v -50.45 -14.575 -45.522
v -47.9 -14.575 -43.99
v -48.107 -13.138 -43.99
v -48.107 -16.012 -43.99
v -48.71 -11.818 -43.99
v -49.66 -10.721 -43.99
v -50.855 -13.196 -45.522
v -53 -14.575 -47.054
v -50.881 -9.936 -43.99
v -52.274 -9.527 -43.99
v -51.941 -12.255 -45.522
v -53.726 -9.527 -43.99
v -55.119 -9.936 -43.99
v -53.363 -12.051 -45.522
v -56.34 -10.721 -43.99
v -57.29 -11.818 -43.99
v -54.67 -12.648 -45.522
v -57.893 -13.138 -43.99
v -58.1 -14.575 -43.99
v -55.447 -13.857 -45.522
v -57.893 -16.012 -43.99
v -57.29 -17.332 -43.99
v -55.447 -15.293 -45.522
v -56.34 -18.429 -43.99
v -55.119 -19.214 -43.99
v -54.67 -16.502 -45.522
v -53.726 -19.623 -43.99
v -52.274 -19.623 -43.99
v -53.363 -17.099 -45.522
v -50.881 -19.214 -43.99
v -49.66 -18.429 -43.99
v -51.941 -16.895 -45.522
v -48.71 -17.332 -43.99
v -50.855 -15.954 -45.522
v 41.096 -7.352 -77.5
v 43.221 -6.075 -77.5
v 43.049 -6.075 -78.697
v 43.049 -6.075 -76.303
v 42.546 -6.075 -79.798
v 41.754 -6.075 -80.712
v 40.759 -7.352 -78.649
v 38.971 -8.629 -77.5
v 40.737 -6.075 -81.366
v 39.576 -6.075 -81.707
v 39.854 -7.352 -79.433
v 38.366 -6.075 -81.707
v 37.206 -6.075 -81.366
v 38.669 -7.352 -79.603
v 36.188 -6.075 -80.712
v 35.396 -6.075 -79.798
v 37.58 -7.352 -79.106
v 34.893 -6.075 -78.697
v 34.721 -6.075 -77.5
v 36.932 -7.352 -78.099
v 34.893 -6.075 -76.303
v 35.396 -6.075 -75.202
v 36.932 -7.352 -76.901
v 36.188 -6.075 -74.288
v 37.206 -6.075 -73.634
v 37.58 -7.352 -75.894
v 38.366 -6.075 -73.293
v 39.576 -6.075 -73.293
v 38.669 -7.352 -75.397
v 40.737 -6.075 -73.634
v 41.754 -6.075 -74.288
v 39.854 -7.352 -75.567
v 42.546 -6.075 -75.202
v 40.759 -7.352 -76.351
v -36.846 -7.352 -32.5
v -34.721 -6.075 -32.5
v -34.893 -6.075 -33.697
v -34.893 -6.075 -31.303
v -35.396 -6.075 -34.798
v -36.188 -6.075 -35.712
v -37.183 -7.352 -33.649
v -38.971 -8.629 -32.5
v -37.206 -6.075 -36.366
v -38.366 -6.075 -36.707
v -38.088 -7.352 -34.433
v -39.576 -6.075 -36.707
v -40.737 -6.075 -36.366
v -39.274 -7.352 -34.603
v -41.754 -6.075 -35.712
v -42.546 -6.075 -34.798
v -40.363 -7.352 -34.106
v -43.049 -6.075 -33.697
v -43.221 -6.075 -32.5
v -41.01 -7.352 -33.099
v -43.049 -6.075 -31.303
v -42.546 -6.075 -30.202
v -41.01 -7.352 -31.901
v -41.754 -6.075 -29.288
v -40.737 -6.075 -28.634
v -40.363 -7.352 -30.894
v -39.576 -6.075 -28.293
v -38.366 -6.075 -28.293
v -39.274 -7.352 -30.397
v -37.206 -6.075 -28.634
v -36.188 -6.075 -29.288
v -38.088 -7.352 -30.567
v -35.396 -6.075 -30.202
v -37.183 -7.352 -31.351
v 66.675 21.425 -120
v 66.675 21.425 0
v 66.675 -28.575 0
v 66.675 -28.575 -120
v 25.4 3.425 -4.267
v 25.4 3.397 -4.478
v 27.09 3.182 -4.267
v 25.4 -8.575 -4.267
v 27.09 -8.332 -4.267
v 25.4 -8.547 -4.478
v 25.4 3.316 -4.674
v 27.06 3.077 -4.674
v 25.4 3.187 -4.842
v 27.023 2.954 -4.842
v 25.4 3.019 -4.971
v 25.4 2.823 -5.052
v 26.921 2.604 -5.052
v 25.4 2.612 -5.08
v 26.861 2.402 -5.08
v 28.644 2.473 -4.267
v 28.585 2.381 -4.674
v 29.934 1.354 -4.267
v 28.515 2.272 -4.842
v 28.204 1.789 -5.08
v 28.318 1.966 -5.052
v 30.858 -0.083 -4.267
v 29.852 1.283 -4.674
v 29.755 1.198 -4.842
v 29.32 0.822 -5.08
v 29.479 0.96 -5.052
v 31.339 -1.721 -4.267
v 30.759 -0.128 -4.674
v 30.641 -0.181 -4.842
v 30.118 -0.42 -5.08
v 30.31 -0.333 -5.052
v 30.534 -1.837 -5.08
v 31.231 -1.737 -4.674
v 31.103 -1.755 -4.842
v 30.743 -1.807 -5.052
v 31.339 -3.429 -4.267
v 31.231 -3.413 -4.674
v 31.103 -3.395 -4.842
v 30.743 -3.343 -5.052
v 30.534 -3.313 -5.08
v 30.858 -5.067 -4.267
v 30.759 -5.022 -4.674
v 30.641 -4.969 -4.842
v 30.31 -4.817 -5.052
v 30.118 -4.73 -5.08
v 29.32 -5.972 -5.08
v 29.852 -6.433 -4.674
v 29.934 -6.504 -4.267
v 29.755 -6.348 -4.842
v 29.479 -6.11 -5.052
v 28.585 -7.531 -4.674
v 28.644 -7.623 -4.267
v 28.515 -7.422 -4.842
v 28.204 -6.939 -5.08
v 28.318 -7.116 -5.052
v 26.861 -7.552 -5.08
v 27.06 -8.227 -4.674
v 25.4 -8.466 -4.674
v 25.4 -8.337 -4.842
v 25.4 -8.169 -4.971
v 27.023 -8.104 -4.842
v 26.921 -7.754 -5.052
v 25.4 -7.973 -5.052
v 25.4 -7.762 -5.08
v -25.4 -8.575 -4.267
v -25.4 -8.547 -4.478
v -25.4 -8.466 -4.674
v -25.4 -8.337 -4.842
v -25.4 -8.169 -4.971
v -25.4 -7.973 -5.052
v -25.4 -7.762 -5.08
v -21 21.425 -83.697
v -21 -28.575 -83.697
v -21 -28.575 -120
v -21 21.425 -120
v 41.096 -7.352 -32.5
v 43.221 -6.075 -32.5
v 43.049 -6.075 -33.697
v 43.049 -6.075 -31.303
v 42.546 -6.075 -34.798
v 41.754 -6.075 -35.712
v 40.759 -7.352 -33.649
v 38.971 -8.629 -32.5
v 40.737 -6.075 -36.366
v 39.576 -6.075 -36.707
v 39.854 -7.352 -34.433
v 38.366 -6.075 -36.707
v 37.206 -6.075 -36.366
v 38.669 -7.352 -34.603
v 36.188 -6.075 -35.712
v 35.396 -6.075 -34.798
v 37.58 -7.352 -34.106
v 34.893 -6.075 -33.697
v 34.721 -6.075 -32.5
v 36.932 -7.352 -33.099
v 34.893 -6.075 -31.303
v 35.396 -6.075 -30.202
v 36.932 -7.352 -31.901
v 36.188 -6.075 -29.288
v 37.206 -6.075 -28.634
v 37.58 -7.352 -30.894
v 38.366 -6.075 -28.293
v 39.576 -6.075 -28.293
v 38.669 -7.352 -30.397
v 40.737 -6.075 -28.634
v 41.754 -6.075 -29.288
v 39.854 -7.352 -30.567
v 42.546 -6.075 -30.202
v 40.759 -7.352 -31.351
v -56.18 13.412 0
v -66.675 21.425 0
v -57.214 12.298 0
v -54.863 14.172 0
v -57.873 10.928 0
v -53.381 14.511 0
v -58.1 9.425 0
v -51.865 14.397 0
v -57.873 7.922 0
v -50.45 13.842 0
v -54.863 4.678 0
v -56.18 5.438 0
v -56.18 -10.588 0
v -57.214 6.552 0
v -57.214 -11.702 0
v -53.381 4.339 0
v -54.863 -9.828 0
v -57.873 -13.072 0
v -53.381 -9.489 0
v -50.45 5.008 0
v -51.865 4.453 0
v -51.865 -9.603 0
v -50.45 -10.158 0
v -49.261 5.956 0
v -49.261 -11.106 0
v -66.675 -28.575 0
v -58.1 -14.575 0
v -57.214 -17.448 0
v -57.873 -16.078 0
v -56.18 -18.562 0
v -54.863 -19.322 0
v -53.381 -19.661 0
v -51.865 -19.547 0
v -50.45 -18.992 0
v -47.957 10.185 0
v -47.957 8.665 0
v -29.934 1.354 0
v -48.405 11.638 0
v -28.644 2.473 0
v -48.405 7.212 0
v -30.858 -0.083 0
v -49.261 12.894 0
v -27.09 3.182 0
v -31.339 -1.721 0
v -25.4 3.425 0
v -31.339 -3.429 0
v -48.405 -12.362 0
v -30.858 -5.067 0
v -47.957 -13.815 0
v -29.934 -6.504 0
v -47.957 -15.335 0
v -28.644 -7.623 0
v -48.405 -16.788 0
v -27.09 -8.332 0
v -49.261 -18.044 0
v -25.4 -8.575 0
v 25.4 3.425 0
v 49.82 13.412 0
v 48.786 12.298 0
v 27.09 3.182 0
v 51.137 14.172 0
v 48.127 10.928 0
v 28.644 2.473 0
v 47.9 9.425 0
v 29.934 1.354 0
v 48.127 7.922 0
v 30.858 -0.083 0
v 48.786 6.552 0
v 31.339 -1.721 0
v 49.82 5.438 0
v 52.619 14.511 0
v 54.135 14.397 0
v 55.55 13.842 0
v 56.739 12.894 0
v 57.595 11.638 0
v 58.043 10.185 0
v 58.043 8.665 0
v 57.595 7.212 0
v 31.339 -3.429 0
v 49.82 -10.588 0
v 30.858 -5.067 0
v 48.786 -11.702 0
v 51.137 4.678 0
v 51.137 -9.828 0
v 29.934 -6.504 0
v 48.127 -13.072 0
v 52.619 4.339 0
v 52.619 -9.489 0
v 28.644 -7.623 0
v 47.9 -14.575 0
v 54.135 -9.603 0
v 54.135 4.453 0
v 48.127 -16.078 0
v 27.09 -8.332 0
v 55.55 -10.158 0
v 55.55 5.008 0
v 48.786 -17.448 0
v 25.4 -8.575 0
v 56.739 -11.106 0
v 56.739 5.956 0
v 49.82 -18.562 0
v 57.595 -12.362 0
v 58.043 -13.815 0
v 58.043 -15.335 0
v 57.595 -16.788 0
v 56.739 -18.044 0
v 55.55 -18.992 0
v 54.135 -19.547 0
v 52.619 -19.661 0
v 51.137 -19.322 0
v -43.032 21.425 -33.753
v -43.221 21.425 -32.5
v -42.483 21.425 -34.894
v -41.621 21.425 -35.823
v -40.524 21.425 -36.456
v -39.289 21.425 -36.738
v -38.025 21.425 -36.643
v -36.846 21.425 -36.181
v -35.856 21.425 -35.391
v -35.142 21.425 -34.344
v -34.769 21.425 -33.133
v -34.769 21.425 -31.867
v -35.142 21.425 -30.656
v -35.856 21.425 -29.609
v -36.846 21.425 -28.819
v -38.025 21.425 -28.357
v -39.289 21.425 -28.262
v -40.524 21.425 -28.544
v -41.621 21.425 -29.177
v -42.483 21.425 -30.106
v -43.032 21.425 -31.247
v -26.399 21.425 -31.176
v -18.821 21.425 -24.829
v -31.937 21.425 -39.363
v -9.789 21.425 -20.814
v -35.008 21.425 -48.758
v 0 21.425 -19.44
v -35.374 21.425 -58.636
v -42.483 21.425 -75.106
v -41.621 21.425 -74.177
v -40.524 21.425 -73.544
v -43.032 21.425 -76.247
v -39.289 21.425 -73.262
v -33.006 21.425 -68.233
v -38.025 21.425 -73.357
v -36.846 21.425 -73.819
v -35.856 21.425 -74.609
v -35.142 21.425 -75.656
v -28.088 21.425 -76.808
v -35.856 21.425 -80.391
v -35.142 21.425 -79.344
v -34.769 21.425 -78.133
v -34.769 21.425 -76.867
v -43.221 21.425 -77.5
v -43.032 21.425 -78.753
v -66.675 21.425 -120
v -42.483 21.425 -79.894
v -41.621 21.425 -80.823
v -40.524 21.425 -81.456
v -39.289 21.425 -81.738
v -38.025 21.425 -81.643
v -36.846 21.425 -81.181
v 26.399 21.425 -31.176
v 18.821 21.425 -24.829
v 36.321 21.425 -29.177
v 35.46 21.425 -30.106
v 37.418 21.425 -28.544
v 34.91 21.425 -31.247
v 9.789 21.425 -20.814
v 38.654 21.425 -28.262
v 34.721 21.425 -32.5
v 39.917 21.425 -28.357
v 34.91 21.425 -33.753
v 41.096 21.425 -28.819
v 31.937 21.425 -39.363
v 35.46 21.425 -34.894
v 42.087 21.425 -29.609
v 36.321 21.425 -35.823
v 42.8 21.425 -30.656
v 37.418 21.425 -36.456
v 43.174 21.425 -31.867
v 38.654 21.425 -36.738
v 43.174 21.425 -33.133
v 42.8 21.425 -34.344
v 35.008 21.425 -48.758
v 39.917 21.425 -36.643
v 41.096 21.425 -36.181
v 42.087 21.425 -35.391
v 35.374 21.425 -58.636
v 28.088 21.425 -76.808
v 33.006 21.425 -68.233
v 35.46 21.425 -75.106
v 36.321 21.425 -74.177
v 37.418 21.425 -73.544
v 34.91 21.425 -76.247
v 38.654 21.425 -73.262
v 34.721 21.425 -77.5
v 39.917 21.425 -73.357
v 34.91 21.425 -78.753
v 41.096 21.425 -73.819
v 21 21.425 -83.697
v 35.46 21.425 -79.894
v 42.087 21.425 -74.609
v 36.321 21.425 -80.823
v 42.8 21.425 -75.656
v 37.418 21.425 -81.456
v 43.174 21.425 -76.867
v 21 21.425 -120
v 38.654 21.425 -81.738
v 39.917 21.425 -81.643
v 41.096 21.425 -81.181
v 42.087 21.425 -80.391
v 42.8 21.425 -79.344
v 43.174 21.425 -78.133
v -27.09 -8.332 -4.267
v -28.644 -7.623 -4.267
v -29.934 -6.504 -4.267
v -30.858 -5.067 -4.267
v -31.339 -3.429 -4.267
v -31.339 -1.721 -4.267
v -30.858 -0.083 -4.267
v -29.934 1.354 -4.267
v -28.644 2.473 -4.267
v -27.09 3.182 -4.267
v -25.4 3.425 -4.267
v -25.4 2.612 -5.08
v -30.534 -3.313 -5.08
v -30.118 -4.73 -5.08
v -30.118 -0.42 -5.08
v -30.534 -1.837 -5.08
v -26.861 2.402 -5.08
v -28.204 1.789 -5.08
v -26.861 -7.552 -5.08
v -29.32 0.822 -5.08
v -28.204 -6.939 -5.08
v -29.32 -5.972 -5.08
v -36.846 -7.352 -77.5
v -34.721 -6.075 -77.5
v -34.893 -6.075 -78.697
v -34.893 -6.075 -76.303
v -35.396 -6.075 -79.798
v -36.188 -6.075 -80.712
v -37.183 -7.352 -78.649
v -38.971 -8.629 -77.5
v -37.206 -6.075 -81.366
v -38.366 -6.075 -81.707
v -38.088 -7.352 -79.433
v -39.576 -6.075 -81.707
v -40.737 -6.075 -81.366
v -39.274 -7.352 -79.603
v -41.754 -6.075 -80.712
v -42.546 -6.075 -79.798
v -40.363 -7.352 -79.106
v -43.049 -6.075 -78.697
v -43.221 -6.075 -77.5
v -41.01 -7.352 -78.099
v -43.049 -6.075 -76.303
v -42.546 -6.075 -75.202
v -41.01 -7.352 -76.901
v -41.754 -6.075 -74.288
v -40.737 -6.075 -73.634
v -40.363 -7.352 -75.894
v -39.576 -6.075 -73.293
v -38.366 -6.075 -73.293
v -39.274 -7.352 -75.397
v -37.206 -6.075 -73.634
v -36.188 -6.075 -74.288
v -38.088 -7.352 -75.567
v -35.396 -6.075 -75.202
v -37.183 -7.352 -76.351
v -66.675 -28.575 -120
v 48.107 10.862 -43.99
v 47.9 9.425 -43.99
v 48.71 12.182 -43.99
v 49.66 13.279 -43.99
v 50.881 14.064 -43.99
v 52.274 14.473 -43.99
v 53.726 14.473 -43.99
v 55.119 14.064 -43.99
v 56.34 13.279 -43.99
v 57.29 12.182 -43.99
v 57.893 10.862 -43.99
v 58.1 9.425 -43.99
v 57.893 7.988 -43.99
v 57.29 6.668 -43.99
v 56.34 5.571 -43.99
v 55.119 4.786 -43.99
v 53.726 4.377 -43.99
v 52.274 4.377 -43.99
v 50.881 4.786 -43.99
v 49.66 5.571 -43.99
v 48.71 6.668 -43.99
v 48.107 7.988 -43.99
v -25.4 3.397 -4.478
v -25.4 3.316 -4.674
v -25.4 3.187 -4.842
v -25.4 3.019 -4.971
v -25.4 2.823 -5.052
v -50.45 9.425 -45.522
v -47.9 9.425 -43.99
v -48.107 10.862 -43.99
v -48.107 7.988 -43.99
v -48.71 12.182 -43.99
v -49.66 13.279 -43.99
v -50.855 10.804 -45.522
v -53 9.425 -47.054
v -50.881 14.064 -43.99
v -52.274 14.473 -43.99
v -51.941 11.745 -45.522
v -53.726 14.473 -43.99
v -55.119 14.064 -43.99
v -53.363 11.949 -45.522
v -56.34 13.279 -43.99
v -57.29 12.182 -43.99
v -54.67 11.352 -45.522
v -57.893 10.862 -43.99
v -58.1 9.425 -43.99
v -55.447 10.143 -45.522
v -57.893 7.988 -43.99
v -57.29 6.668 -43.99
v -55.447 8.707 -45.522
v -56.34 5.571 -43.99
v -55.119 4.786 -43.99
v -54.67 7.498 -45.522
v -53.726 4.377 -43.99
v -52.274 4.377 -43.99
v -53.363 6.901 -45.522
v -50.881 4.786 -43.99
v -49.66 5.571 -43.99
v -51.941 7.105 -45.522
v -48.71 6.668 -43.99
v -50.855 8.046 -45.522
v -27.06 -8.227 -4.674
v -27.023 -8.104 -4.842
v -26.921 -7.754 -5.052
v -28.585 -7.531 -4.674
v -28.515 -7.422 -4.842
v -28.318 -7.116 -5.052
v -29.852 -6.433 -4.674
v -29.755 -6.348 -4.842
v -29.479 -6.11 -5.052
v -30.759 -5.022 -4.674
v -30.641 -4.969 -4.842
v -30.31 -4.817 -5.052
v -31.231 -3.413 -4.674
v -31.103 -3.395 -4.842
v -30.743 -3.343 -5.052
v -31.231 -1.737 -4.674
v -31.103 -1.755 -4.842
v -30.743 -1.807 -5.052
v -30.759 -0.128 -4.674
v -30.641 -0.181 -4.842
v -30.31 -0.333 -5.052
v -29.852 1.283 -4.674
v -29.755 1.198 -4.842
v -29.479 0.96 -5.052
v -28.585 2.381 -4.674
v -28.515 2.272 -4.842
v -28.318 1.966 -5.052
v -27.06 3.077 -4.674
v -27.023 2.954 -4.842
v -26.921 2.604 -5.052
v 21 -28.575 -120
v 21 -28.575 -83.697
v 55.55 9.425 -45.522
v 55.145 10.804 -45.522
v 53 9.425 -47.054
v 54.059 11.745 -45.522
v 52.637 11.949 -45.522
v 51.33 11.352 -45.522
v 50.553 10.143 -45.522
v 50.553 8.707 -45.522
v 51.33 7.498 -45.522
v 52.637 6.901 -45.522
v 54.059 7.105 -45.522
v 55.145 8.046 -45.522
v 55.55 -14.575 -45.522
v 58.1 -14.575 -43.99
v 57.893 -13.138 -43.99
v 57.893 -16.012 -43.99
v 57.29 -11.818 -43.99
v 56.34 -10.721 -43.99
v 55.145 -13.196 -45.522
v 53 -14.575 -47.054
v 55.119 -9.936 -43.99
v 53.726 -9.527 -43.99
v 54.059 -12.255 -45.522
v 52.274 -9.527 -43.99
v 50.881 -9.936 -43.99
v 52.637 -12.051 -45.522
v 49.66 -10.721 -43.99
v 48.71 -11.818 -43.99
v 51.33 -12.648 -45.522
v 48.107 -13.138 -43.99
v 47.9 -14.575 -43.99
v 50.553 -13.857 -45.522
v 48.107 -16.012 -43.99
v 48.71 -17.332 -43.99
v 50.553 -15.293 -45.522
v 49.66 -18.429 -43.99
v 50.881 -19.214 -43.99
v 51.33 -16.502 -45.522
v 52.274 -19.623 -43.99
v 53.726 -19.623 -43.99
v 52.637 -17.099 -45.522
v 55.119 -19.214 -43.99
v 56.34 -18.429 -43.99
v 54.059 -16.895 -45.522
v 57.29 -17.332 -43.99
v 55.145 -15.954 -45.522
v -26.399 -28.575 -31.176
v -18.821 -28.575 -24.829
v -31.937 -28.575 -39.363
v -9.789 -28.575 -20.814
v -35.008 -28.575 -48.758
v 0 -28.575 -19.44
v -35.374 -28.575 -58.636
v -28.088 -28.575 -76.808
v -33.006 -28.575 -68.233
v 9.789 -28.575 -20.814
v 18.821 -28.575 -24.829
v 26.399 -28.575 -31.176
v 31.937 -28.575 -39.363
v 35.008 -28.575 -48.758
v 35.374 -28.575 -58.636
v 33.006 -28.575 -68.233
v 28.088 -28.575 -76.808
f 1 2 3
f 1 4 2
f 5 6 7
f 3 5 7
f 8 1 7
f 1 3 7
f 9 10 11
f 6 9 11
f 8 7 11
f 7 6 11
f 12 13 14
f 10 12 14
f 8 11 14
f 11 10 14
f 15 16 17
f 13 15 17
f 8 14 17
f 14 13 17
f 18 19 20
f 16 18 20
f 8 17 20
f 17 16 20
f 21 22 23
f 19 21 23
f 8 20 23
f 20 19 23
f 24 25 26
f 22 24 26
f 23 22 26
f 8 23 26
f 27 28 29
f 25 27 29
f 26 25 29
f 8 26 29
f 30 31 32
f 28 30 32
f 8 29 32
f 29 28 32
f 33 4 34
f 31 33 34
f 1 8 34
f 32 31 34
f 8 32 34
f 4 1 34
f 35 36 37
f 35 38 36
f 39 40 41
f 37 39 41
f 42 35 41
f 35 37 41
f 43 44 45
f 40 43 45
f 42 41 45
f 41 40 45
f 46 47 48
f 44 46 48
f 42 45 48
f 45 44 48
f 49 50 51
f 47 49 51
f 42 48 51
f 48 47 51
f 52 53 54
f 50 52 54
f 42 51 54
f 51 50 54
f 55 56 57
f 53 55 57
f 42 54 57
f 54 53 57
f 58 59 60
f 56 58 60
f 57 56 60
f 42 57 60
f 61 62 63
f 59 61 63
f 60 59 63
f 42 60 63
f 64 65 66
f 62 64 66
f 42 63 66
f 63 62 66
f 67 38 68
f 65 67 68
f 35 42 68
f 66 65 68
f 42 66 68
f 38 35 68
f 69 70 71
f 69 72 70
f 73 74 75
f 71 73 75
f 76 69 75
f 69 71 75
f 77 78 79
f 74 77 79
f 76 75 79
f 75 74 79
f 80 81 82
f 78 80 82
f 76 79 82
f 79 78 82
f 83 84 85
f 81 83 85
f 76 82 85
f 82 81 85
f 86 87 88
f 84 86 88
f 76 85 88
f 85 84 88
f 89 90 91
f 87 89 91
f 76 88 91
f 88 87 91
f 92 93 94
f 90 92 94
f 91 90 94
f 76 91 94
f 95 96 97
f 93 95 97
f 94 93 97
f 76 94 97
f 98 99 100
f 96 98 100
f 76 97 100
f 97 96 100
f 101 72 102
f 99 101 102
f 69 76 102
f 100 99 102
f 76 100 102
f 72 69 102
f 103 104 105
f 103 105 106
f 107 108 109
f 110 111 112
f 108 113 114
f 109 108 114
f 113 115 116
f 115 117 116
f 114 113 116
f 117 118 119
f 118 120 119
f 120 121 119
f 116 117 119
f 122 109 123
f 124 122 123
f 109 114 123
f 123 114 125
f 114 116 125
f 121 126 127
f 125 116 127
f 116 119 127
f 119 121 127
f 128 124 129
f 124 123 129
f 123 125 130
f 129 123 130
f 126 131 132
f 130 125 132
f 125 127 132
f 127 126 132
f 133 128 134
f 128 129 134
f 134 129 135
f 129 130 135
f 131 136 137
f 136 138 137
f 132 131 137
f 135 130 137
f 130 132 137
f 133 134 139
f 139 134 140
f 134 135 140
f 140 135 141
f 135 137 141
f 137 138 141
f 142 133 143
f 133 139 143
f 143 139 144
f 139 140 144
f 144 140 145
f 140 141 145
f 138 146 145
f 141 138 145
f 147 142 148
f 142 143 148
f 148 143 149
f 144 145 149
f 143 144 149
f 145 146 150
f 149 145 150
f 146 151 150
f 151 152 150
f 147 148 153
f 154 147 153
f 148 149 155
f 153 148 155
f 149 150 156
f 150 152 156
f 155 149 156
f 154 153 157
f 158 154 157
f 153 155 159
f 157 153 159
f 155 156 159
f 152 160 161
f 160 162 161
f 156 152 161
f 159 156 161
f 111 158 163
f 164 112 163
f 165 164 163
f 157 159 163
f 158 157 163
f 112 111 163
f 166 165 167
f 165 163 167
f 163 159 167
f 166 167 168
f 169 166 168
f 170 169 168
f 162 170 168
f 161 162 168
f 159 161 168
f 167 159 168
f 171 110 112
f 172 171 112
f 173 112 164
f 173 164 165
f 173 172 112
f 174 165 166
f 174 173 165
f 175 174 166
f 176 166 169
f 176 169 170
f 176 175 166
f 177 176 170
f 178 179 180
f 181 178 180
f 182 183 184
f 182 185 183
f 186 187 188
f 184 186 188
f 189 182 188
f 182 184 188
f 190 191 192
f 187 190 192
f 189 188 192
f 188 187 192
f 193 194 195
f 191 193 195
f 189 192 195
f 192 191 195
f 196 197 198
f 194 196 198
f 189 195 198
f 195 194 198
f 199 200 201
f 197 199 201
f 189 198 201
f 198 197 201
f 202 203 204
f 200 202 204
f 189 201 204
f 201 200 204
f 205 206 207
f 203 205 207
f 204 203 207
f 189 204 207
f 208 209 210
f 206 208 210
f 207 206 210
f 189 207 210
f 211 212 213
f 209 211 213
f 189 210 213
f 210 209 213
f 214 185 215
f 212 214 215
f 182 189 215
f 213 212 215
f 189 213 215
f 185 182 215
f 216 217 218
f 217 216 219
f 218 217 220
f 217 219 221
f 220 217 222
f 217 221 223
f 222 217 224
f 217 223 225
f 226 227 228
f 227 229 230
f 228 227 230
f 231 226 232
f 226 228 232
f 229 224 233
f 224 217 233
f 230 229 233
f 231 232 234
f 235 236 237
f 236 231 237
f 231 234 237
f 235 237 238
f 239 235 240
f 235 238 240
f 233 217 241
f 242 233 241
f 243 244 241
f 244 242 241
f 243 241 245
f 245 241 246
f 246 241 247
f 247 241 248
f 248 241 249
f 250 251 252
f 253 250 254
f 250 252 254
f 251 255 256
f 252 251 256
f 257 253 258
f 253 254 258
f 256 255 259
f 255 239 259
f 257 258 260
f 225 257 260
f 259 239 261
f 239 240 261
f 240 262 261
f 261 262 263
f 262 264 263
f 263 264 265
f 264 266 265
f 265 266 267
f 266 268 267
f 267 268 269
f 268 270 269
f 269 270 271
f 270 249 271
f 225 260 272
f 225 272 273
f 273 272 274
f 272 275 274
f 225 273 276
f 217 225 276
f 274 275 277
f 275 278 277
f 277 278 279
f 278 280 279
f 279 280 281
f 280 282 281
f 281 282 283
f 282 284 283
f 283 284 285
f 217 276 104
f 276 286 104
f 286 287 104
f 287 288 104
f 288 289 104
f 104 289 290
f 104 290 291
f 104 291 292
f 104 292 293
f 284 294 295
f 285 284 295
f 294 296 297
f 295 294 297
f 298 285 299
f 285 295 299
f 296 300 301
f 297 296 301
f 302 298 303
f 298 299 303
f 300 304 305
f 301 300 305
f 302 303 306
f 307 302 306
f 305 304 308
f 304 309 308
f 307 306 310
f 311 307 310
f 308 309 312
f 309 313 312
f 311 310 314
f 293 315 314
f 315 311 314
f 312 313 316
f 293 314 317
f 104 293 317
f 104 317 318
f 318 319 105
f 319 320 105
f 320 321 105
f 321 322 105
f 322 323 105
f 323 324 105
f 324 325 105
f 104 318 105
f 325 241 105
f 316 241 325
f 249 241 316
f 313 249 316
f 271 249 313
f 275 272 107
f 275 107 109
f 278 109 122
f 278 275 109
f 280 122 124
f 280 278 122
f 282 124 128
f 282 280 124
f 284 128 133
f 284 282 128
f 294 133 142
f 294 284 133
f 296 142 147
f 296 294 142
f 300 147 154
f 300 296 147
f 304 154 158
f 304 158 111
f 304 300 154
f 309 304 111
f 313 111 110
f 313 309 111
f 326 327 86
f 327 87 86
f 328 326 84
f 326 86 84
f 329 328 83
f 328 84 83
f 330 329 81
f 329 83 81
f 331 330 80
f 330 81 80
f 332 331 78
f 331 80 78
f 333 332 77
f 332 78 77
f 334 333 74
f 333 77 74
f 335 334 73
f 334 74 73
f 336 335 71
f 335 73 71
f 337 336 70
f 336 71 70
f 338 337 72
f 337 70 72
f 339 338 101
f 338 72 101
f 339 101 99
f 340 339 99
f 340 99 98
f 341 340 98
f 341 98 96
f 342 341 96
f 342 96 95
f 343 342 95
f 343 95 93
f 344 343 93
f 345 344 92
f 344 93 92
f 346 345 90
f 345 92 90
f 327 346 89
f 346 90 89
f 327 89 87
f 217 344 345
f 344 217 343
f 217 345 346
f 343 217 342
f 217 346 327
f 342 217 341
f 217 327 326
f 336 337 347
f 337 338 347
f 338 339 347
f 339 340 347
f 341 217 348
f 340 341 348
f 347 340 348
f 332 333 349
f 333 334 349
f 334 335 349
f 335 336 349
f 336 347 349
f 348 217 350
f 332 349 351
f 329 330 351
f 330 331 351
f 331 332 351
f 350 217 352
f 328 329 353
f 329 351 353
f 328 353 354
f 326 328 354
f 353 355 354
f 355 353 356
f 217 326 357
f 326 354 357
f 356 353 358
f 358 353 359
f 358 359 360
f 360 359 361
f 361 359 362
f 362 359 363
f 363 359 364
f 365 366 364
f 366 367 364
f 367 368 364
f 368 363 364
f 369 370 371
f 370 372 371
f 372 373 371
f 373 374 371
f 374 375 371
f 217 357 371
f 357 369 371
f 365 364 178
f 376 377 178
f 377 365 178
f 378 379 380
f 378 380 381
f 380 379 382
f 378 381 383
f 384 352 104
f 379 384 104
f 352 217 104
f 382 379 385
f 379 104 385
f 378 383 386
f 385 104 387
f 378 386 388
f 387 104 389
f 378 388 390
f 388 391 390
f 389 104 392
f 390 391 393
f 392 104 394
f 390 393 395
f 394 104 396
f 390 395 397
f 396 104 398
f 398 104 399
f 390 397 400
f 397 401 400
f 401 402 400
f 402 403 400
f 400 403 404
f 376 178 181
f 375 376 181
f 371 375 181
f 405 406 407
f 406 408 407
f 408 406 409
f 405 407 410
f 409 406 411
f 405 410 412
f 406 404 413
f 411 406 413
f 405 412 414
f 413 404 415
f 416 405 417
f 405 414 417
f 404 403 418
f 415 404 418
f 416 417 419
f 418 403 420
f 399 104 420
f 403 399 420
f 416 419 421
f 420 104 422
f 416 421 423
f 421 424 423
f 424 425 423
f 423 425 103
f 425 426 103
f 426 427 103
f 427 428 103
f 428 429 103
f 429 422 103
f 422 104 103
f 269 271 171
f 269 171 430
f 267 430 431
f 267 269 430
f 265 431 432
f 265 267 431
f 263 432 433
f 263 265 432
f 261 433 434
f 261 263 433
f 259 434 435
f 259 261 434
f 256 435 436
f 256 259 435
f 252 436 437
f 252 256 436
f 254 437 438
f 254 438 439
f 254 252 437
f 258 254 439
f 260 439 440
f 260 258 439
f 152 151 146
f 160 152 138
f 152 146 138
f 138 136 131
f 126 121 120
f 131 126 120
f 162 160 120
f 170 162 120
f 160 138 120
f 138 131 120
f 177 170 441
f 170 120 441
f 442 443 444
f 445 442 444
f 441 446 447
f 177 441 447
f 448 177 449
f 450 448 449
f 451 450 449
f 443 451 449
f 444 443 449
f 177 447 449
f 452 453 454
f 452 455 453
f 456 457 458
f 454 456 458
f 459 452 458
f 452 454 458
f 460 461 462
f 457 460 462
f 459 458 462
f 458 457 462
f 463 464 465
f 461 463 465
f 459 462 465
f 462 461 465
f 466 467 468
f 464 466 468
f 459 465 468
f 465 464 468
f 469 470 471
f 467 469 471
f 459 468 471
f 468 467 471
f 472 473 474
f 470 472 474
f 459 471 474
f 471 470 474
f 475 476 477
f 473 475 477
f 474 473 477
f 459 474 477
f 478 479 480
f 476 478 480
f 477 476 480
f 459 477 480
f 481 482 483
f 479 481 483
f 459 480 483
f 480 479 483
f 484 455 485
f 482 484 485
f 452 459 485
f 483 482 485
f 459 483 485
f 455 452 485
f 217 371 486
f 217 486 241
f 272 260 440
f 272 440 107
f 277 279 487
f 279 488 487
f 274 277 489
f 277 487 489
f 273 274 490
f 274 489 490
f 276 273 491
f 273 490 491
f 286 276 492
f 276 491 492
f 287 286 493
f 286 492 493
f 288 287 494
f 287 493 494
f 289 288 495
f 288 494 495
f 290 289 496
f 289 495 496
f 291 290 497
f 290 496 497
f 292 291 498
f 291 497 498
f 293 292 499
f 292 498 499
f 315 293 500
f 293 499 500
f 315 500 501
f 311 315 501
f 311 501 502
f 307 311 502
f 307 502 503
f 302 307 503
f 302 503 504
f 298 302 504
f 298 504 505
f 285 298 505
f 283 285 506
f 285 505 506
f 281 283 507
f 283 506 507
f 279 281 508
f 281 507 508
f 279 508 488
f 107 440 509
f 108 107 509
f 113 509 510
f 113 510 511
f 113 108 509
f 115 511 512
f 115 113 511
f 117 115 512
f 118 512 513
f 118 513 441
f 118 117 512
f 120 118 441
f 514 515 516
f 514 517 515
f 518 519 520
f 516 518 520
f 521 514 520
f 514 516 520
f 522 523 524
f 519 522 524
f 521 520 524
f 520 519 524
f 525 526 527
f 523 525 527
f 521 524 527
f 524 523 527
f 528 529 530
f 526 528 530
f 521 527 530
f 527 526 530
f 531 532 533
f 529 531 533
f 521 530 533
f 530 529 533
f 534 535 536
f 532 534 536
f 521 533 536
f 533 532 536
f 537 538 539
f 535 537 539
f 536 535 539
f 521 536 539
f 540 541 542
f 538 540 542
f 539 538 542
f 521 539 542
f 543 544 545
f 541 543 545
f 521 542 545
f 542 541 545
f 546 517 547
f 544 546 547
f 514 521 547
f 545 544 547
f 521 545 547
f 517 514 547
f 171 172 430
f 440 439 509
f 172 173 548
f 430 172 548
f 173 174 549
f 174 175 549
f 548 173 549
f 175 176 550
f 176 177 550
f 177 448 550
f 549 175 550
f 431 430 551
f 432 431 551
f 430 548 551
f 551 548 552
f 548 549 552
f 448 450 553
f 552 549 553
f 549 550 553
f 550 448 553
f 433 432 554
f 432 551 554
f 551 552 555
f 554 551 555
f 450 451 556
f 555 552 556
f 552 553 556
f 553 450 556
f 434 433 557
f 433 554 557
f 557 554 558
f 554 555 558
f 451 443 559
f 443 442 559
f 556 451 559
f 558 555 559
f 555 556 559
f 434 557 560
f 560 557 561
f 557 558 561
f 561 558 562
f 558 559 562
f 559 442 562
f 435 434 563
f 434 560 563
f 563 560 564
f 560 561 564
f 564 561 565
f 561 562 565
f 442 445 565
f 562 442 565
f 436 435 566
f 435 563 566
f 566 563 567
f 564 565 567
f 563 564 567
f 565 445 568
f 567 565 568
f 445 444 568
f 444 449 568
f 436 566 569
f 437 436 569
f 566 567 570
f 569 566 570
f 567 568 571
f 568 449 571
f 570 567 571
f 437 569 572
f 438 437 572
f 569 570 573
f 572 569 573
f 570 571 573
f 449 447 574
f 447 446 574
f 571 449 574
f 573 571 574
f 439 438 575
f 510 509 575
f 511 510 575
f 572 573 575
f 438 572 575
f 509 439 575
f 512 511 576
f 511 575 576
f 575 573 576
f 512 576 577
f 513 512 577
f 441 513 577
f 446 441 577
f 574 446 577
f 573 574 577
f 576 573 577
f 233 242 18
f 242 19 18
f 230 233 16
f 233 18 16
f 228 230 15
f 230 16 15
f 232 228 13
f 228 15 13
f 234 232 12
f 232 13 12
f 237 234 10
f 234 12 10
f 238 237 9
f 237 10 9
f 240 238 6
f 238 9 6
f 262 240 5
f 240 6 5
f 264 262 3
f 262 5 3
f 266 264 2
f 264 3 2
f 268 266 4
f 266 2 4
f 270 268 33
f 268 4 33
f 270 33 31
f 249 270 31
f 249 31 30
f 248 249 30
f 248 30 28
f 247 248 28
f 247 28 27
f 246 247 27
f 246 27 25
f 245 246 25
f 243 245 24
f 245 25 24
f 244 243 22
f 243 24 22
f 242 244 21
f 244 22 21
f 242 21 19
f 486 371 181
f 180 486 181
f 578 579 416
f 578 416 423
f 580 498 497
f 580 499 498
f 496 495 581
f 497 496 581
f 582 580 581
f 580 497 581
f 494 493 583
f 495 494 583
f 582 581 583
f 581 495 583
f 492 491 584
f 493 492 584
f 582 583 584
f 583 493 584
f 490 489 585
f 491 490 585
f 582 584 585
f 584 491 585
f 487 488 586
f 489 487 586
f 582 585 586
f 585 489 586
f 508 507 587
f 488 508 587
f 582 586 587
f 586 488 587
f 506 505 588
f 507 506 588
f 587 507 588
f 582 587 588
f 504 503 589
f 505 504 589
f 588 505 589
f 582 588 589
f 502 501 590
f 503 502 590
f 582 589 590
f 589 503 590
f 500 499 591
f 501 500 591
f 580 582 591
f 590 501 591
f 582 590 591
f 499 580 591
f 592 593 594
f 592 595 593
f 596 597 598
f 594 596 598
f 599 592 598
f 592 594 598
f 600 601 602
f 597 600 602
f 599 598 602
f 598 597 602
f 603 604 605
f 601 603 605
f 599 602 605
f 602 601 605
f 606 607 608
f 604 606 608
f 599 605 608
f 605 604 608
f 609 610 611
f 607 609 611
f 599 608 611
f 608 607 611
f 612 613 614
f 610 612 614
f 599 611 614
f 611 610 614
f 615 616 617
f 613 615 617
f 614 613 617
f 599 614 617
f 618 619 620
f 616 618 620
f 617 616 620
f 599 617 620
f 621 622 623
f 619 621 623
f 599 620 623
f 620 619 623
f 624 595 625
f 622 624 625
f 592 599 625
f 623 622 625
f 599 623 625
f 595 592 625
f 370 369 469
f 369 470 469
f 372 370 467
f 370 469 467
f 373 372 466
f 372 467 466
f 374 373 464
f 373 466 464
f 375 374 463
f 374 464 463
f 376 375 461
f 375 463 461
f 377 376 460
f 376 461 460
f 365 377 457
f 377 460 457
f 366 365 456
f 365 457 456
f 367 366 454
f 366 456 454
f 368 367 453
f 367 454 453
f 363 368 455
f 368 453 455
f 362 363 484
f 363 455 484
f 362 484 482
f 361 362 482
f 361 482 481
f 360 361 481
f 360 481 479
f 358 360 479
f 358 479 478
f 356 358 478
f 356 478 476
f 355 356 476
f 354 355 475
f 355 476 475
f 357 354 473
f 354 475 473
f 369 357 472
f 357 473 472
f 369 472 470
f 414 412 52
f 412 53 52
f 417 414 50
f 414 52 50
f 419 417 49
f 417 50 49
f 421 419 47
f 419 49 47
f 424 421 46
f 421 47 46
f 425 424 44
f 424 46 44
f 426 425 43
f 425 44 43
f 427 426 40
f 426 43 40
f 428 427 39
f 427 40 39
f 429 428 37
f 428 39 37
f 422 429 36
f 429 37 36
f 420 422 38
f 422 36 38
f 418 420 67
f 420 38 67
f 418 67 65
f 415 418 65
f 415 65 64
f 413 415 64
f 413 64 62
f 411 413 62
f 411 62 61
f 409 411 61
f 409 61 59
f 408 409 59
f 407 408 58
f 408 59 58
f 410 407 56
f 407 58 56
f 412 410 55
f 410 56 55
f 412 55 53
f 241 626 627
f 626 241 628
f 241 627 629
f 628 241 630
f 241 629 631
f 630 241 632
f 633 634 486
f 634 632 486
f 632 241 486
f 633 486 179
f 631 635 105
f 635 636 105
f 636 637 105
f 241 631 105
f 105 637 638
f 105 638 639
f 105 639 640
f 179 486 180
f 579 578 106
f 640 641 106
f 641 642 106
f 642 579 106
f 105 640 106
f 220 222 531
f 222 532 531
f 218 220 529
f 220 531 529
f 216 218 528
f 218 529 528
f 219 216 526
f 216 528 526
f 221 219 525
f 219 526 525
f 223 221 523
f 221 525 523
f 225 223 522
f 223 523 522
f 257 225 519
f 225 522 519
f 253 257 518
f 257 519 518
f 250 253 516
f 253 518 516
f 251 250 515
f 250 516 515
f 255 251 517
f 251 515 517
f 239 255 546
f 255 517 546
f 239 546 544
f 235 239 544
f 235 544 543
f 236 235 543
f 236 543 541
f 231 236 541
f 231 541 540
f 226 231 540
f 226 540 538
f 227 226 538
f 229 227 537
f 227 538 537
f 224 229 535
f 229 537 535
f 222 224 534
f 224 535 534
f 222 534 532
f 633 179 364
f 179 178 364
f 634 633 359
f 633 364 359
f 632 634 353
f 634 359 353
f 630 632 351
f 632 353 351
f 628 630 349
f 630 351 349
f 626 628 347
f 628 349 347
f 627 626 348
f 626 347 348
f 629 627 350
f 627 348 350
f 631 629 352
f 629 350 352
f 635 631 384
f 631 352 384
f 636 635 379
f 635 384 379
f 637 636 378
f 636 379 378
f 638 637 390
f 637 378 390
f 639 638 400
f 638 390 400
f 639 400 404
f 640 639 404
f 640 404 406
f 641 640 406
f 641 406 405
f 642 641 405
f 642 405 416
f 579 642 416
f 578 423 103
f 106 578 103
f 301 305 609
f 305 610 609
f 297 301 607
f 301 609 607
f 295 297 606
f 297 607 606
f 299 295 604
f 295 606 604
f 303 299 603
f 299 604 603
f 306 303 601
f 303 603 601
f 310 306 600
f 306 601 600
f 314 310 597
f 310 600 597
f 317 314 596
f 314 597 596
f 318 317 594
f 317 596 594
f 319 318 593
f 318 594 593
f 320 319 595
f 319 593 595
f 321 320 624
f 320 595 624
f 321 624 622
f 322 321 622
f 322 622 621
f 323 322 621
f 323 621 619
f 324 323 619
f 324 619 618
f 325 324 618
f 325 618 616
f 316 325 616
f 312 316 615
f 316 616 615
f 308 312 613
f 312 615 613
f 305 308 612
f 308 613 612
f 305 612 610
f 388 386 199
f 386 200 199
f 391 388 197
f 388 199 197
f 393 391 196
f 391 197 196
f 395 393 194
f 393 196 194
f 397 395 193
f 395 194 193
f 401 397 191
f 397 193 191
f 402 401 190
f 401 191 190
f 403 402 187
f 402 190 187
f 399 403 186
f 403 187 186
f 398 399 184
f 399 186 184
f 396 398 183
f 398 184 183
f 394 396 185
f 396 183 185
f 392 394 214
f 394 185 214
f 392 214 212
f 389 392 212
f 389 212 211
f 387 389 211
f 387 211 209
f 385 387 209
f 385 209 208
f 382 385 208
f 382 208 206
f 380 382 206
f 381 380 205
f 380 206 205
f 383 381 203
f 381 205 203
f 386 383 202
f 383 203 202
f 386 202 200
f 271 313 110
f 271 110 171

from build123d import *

# Parameters (mm, degrees)
SKETCH1_W               = 133.35
SKETCH1_H               = 120.65
BOSS_EXTRUDE1_DEPTH     = 28.575
CUT_EXTRUDE2_DEPTH      = 141.221561288
CUT_EXTRUDE2_DEPTH_BACK = 141.221561288
SKETCH1_3_W             = 133.35
SKETCH1_3_H             = 0.65
SKETCH2_W               = 120
SKETCH2_H               = 7.15
CUT_EXTRUDE3_DEPTH      = 182.655589303
SKETCH3_R               = 35.56
CUT_EXTRUDE4_DEPTH      = 147.101182832
SKETCH4_W               = 42
SKETCH4_H               = 36.303073335
CUT_EXTRUDE5_DEPTH      = 147.101182832
M10_TAPPED_HOLE1_D      = 8.5
M10_TAPPED_HOLE1_DEPTH  = 27.5
M10_TAPPED_HOLE1_TIP    = 2.553657631
M12_TAPPED_HOLE1_D      = 10.2
M12_TAPPED_HOLE1_DEPTH  = 43.99
M12_TAPPED_HOLE1_TIP    = 3.064389157
CUT_EXTRUDE6_DEPTH      = 5.08
FILLET1_R               = 0.8128


with BuildPart() as part:
    # Sketch1 → Boss-Extrude1 (new, symmetric)
    with BuildSketch(Plane(origin=(0, 0, 0), x_dir=(1, 0, 0), z_dir=(0, 1, 0))):
        with Locations((0, 59.675)):
            Rectangle(SKETCH1_W, SKETCH1_H)
    extrude(amount=BOSS_EXTRUDE1_DEPTH, both=True)

    # Sketch1<3> → Cut-Extrude2 (cut, two sides: drawn at the far end of the back side and taken through both)
    with BuildSketch(Plane(origin=(0, 0, 0), x_dir=(1, 0, 0), z_dir=(0, 1, 0)).offset(-CUT_EXTRUDE2_DEPTH_BACK)):
        with Locations((0, -0.325)):
            Rectangle(SKETCH1_3_W, SKETCH1_3_H)
    extrude(amount=CUT_EXTRUDE2_DEPTH + CUT_EXTRUDE2_DEPTH_BACK, mode=Mode.SUBTRACT)

    # Sketch2 → Cut-Extrude3 (cut, through all)
    with BuildSketch(Plane(origin=(66.675, 0, 0), x_dir=(0, 0, -1), z_dir=(1, 0, 0))):
        with Locations((60, 25)):
            Rectangle(SKETCH2_W, SKETCH2_H)
    extrude(amount=-CUT_EXTRUDE3_DEPTH, mode=Mode.SUBTRACT)

    # Sketch3 → Cut-Extrude4 (cut, through all)
    with BuildSketch(Plane(origin=(0, 21.425, 0), x_dir=(1, 0, 0), z_dir=(0, 1, 0))):
        with Locations((0, 55)):
            Circle(SKETCH3_R)
    extrude(amount=-CUT_EXTRUDE4_DEPTH, mode=Mode.SUBTRACT)

    # Sketch4 → Cut-Extrude5 (cut, through all)
    with BuildSketch(Plane(origin=(0, 21.425, 0), x_dir=(1, 0, 0), z_dir=(0, 1, 0))):
        with Locations((0, 101.848463333)):
            Rectangle(SKETCH4_W, SKETCH4_H)
    extrude(amount=-CUT_EXTRUDE5_DEPTH, mode=Mode.SUBTRACT)

    # M10 Tapped Hole1
    with Locations(Plane(origin=(0, 21.425, 0), x_dir=(1, 0, 0), z_dir=(0, 1, 0))):
        with Locations((-38.97114317, 77.5), (-38.97114317, 32.5), (38.97114317, 77.5), (38.97114317, 32.5)):
            Hole(M10_TAPPED_HOLE1_D / 2, depth=M10_TAPPED_HOLE1_DEPTH)
            with Locations((0, 0, -(M10_TAPPED_HOLE1_DEPTH + M10_TAPPED_HOLE1_TIP / 2))):  # 118° drill point
                Cone(0, M10_TAPPED_HOLE1_D / 2, M10_TAPPED_HOLE1_TIP, mode=Mode.SUBTRACT)

    # M12 Tapped Hole1
    with Locations(Plane.XY):
        with Locations((-53, 9.425), (-53, -14.575), (53, 9.425), (53, -14.575)):
            Hole(M12_TAPPED_HOLE1_D / 2, depth=M12_TAPPED_HOLE1_DEPTH)
            with Locations((0, 0, -(M12_TAPPED_HOLE1_DEPTH + M12_TAPPED_HOLE1_TIP / 2))):  # 118° drill point
                Cone(0, M12_TAPPED_HOLE1_D / 2, M12_TAPPED_HOLE1_TIP, mode=Mode.SUBTRACT)

    # Sketch9 → Cut-Extrude6 (cut)
    with BuildSketch(Plane.XY):
        with BuildLine():
            Line((-25.4, 3.425), (25.4, 3.425))
            ThreePointArc((25.4, 3.425), (31.4, -2.575), (25.4, -8.575))
            Line((25.4, -8.575), (-25.4, -8.575))
            ThreePointArc((-25.4, -8.575), (-31.4, -2.575), (-25.4, 3.425))
        make_face()
    extrude(amount=-CUT_EXTRUDE6_DEPTH, mode=Mode.SUBTRACT)

    # Fillet1
    fillet1_edges = [part.edges().sort_by_distance(p)[0] for p in [
        (0, -8.575, -5.08),
        (-31.4, -2.575, -5.08),
        (0, 3.425, -5.08),
        (31.4, -2.575, -5.08),
    ]]
    fillet(fillet1_edges, radius=FILLET1_R)


solid = part.part
